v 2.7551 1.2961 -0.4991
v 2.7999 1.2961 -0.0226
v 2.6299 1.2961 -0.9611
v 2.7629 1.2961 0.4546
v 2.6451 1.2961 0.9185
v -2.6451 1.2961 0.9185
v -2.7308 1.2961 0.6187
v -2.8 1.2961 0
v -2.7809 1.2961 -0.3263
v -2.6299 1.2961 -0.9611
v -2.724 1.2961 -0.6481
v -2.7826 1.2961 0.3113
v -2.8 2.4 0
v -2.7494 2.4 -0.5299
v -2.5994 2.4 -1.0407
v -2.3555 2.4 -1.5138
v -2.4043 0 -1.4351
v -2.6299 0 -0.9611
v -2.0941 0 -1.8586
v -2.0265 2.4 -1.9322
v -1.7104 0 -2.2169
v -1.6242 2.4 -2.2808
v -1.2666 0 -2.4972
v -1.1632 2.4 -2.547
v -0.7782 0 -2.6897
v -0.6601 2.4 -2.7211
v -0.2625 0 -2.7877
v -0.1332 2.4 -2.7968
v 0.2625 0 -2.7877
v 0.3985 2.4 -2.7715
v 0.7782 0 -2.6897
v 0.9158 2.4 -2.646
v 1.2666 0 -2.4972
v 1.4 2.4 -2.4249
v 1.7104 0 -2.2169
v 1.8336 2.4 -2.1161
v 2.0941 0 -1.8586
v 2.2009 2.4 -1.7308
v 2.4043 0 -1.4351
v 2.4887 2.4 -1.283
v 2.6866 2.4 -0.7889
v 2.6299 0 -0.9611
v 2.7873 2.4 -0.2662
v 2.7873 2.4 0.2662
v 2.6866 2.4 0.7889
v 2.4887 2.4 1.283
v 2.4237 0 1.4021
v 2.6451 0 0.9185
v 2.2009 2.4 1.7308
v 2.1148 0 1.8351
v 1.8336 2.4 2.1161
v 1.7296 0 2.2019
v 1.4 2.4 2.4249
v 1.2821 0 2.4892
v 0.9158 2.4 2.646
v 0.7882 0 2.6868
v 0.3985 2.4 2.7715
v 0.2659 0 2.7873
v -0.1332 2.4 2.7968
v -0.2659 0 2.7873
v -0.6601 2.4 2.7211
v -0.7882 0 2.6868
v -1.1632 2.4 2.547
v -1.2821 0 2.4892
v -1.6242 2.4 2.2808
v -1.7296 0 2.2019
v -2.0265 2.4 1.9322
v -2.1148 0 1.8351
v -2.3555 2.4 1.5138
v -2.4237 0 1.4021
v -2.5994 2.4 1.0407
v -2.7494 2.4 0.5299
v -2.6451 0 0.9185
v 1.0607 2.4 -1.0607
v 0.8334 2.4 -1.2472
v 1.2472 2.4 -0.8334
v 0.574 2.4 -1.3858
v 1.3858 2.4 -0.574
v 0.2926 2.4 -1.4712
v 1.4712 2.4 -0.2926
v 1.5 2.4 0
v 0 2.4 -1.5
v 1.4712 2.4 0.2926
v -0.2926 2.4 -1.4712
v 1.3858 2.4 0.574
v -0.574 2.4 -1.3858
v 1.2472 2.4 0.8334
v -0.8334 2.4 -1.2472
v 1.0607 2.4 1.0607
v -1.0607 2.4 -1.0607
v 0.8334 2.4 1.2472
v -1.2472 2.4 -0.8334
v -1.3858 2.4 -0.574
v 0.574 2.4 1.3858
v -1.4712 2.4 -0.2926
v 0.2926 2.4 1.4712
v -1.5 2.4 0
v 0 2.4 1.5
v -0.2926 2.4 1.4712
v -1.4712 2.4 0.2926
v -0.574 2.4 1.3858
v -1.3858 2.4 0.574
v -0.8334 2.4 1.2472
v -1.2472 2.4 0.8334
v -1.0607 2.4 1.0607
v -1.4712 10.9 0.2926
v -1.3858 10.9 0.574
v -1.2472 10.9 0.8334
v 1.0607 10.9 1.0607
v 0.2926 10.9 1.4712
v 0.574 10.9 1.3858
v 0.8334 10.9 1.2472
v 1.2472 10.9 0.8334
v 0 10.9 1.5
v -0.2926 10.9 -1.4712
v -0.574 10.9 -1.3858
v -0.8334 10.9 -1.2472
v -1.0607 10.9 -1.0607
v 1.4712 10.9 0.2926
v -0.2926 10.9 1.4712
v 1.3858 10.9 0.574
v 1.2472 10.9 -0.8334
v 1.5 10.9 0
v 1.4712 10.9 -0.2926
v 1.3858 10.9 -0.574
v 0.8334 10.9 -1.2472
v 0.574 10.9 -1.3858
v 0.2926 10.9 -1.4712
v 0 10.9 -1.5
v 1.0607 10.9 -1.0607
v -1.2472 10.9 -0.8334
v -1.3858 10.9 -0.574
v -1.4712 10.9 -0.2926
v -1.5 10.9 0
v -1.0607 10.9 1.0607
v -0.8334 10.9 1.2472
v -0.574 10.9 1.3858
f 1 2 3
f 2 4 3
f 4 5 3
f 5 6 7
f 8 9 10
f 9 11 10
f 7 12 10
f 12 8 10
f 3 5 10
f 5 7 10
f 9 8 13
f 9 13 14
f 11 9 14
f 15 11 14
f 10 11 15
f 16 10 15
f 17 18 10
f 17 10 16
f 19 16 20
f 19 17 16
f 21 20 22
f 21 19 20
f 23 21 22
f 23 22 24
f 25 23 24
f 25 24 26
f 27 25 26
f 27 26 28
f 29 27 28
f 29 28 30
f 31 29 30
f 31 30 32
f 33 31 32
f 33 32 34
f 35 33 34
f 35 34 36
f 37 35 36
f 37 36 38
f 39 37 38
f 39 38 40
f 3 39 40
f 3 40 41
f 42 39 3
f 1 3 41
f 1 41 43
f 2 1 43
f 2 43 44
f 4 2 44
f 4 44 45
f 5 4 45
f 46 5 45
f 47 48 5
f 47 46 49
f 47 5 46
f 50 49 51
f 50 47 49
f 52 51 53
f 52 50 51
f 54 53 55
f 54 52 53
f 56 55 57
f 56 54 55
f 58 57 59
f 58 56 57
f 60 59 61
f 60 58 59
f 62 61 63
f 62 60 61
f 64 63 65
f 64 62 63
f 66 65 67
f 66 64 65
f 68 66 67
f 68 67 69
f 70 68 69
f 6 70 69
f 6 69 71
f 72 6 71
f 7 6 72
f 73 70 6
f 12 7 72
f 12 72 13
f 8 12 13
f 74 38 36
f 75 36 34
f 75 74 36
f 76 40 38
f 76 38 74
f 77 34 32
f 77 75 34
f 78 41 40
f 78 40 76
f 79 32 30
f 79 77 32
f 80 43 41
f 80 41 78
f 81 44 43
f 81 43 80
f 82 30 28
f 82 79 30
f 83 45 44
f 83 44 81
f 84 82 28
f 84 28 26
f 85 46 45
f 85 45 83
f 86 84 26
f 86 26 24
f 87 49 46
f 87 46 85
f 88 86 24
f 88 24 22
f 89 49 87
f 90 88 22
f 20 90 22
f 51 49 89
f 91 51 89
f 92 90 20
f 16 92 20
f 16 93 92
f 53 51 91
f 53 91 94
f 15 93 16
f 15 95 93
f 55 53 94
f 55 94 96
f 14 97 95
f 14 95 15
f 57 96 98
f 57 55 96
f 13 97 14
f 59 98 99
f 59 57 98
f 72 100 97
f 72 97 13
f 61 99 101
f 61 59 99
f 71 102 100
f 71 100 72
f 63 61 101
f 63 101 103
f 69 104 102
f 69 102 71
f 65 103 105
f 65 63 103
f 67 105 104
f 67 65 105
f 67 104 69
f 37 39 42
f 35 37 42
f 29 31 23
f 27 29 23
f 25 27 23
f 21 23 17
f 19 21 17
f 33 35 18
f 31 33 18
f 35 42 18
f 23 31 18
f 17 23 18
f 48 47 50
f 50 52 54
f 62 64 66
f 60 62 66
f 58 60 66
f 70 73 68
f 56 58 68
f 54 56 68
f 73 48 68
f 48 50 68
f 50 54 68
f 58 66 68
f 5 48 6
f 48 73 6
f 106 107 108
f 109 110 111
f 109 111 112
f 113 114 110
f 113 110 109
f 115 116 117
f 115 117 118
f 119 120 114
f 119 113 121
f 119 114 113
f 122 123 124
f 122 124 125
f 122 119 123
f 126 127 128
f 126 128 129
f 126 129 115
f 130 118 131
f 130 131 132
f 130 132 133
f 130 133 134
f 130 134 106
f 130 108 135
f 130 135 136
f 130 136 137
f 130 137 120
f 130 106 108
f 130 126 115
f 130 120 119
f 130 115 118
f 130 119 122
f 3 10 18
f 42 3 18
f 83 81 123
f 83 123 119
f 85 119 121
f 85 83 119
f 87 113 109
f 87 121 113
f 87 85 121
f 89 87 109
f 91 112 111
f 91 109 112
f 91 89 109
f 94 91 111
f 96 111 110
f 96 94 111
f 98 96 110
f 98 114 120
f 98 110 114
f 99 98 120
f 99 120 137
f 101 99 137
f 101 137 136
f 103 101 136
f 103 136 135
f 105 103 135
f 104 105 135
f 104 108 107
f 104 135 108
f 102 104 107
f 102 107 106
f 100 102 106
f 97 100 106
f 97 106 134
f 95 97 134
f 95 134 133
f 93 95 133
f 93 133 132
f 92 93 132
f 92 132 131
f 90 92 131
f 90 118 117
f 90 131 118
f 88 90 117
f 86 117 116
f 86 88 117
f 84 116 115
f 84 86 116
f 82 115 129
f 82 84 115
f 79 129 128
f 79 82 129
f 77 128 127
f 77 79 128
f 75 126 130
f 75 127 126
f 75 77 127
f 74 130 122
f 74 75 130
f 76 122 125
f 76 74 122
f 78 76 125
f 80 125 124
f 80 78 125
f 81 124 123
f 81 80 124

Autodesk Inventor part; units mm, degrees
ref_plane "YZ Plane" through (0, 0, 0) normal (1, 0, 0) x (0, 1, 0)
ref_plane "XZ Plane" through (0, 0, 0) normal (0, 1, 0) x (-1, 0, 0)
ref_plane "XY Plane" through (0, 0, 0) normal (0, 0, 1) x (1, 0, 0)
sketch "Esboço1" plane through (0, 0, 0) normal (0, 1, 0) x (-1, 0, 0)
  circle A0 centre (0, 0) radius 2.8
  dimension "d0" = 5.6
extrude "Extrusão1" add sketch "Esboço1" along normal blind 2.4
sketch "Esboço2" plane through (0, 0, 0) normal (1, 0, 0) x (0, 1, 0)
  line L0 (0, 0.9185) -> (1.2961, 0.9185)
  line L1 (1.2961, 0.9185) -> (1.2961, -0.9611)
  line L2 (1.2961, -0.9611) -> (0, -0.9611)
  line L3 (0, -0.9611) -> (0, 0.9185)
  point P0 (0, 0)
extrude "Extrusão2" cut sketch "Esboço2" along normal through all both and the other way through all
sketch "Esboço3" plane through (0, 2.4, 0) normal (0, 1, 0) x (1, 0, 0)
  circle A0 centre (0, 0) radius 2.8 projected
  circle A1 centre (0, 0) radius 1.5
  dimension "d5" = 3
extrude "Extrusão3" add sketch "Esboço3" along normal blind 8.5 contours A1
thread "Rosca1" size "M3x0.5" class "6g" standard "ANSI Metric M Profile" full length
properties part number "Parafuso-M3-8.5"
